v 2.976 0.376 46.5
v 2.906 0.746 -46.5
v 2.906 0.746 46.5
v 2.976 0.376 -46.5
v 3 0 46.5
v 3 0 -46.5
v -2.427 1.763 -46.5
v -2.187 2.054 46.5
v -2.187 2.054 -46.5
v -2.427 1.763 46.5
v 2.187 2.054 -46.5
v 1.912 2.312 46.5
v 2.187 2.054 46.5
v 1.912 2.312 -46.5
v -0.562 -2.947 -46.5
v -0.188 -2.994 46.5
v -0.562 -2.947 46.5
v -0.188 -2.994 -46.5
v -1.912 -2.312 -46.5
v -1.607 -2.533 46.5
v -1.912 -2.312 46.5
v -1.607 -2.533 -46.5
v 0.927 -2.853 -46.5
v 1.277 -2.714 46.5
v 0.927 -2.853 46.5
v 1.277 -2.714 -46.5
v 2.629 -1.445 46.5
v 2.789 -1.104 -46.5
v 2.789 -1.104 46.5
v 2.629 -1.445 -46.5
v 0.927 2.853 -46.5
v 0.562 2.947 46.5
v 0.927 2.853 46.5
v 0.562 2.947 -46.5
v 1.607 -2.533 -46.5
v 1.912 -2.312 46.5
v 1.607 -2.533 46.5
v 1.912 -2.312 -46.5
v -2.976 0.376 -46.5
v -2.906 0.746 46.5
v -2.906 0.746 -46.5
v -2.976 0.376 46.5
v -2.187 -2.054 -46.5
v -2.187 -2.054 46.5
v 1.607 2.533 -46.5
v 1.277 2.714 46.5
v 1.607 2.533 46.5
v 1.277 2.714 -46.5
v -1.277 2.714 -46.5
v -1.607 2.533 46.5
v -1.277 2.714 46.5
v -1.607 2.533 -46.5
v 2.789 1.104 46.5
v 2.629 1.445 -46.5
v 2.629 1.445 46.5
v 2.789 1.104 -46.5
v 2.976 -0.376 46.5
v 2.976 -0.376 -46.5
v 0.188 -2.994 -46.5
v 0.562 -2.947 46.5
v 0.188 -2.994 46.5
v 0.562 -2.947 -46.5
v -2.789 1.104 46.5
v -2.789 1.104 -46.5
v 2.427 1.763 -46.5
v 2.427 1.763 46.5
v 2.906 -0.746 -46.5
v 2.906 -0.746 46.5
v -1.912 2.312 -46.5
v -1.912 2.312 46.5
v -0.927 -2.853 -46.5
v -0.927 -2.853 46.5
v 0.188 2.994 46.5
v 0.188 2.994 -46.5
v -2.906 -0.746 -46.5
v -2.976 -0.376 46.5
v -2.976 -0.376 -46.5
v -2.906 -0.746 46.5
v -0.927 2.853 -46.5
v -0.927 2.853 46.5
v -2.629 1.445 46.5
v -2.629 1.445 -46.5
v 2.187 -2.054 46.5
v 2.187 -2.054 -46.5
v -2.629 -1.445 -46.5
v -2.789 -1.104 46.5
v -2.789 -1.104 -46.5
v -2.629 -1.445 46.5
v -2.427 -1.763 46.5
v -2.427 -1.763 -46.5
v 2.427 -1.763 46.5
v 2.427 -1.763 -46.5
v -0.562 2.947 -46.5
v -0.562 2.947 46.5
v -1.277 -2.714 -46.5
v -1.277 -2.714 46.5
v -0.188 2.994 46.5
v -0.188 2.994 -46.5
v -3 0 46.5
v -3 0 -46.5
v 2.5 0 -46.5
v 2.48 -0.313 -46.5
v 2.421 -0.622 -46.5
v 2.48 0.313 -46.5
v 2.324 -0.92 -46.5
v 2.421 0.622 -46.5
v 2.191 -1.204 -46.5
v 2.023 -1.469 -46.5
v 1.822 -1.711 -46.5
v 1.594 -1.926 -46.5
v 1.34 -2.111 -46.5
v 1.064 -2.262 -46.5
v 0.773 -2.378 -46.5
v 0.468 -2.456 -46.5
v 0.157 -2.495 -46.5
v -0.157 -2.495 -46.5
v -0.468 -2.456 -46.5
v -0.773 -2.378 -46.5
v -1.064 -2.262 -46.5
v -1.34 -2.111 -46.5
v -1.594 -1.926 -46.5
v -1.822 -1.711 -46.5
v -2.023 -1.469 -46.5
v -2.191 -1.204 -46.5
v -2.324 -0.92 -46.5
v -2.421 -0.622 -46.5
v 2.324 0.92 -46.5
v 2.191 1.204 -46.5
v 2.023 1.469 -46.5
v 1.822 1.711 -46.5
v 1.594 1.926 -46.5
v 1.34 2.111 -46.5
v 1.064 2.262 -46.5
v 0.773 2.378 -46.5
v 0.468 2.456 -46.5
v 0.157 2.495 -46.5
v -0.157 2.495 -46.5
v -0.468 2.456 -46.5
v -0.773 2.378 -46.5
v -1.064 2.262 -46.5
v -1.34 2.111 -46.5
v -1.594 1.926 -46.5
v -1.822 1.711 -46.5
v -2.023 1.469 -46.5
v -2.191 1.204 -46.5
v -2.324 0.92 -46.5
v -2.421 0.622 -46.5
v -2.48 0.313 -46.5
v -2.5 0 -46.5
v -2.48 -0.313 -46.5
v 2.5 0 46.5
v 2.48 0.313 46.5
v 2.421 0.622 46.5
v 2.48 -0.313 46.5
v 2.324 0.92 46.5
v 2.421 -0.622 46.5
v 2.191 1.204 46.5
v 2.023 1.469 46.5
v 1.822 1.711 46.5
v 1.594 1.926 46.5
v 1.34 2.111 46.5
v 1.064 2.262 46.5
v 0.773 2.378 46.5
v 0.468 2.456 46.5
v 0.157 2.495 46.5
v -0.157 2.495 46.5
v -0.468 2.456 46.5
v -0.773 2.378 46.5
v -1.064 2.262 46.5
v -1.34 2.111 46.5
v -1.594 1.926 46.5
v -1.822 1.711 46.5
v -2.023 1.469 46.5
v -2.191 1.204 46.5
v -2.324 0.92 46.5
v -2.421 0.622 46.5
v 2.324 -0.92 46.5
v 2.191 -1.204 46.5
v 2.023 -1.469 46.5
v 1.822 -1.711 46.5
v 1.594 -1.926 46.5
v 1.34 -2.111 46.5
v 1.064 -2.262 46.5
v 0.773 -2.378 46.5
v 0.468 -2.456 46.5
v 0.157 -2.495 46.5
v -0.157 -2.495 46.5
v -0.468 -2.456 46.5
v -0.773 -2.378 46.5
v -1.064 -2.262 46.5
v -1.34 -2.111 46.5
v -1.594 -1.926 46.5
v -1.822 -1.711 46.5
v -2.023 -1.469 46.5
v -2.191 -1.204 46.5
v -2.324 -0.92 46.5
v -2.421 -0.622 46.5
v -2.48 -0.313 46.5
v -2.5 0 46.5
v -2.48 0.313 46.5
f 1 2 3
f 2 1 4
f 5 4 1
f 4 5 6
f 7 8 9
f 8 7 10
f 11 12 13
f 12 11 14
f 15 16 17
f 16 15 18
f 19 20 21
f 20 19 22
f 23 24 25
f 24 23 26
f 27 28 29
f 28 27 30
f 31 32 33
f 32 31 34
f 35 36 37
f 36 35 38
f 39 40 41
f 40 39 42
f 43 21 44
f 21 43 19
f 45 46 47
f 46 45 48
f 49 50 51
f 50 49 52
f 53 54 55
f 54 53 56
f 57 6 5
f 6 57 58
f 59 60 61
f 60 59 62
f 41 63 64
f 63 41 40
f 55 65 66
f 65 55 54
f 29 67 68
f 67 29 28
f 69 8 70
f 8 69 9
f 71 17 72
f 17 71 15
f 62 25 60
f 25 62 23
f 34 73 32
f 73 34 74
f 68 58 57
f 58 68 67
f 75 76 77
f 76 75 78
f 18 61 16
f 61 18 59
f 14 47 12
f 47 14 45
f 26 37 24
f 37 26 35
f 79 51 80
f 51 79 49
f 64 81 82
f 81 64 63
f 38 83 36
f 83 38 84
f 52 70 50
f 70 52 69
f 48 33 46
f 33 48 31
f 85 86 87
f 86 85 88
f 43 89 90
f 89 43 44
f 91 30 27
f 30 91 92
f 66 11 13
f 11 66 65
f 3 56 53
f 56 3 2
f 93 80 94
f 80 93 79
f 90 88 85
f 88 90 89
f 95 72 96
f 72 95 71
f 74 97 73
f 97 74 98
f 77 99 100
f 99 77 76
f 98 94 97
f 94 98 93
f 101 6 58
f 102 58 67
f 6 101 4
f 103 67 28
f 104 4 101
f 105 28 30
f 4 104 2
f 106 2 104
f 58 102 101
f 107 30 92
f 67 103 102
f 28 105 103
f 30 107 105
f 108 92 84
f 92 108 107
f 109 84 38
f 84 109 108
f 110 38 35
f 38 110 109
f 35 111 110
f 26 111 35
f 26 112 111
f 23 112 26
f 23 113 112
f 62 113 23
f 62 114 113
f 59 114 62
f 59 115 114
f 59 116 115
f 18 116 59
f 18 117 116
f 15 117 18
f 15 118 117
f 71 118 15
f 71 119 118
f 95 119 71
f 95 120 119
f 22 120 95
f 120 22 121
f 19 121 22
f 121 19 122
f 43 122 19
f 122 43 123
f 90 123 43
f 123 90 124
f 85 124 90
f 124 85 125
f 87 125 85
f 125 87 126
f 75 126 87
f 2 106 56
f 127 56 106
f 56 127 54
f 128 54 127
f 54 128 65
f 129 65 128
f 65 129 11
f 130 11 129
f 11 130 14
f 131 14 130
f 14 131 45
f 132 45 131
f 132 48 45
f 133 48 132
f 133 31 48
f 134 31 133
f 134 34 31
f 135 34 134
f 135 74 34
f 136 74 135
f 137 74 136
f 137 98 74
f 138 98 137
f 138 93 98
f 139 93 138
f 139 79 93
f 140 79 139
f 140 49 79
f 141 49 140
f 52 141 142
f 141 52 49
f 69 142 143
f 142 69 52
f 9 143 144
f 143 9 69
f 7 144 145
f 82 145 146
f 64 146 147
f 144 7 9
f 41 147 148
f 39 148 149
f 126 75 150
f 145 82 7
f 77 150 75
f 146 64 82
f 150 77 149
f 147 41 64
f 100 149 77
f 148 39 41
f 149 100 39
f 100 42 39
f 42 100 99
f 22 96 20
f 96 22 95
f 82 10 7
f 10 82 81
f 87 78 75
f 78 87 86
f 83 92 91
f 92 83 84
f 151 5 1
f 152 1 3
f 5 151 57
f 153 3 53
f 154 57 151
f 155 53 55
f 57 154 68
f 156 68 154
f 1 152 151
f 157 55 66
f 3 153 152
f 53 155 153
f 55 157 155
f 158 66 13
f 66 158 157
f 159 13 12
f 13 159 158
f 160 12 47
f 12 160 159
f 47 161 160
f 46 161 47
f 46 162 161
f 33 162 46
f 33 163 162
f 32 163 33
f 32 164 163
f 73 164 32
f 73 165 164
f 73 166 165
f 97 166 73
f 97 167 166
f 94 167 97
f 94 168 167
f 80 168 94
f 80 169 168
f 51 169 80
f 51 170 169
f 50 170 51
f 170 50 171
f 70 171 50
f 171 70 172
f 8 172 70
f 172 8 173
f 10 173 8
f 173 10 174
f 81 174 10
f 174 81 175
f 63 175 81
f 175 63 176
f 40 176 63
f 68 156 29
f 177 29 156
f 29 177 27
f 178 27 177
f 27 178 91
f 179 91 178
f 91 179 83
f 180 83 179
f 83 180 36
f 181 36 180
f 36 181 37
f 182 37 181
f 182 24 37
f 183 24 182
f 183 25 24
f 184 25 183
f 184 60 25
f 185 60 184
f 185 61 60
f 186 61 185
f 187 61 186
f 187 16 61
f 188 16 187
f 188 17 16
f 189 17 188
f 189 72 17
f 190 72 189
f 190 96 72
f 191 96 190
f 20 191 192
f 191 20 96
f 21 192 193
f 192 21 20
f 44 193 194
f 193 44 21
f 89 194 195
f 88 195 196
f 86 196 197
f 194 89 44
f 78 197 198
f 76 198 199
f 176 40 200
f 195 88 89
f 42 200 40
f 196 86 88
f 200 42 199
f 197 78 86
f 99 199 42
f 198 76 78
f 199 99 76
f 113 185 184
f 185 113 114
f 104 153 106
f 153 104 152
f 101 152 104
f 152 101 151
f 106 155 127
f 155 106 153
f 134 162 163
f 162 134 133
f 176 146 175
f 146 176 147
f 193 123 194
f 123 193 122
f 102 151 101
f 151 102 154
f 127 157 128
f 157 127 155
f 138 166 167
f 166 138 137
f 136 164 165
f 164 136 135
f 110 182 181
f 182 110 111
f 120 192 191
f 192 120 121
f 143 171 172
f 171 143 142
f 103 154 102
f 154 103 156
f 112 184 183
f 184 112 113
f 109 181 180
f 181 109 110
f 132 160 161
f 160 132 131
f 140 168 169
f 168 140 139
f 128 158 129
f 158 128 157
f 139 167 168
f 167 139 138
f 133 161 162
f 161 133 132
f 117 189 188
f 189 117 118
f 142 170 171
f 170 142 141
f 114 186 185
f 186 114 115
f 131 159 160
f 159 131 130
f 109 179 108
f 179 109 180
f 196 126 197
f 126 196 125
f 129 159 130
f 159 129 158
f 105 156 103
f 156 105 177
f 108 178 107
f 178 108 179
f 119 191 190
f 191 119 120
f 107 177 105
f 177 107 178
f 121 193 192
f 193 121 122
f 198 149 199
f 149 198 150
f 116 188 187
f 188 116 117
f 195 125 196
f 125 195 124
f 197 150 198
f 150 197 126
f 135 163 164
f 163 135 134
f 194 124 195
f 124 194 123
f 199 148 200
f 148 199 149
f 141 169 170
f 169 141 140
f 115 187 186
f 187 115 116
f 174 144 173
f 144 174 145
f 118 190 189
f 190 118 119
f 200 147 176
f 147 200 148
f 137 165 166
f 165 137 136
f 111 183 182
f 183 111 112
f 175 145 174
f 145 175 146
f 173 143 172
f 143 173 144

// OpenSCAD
$fn = 50;


difference() {
	union() {
		translate(v = [0, 0, -46.5000000000]) {
			cylinder(h = 93, r = 3.0000000000);
		}
	}
	union() {
		translate(v = [0, 0, -100.0000000000]) {
			cylinder(h = 200, r = 2.5000000000);
		}
	}
}
